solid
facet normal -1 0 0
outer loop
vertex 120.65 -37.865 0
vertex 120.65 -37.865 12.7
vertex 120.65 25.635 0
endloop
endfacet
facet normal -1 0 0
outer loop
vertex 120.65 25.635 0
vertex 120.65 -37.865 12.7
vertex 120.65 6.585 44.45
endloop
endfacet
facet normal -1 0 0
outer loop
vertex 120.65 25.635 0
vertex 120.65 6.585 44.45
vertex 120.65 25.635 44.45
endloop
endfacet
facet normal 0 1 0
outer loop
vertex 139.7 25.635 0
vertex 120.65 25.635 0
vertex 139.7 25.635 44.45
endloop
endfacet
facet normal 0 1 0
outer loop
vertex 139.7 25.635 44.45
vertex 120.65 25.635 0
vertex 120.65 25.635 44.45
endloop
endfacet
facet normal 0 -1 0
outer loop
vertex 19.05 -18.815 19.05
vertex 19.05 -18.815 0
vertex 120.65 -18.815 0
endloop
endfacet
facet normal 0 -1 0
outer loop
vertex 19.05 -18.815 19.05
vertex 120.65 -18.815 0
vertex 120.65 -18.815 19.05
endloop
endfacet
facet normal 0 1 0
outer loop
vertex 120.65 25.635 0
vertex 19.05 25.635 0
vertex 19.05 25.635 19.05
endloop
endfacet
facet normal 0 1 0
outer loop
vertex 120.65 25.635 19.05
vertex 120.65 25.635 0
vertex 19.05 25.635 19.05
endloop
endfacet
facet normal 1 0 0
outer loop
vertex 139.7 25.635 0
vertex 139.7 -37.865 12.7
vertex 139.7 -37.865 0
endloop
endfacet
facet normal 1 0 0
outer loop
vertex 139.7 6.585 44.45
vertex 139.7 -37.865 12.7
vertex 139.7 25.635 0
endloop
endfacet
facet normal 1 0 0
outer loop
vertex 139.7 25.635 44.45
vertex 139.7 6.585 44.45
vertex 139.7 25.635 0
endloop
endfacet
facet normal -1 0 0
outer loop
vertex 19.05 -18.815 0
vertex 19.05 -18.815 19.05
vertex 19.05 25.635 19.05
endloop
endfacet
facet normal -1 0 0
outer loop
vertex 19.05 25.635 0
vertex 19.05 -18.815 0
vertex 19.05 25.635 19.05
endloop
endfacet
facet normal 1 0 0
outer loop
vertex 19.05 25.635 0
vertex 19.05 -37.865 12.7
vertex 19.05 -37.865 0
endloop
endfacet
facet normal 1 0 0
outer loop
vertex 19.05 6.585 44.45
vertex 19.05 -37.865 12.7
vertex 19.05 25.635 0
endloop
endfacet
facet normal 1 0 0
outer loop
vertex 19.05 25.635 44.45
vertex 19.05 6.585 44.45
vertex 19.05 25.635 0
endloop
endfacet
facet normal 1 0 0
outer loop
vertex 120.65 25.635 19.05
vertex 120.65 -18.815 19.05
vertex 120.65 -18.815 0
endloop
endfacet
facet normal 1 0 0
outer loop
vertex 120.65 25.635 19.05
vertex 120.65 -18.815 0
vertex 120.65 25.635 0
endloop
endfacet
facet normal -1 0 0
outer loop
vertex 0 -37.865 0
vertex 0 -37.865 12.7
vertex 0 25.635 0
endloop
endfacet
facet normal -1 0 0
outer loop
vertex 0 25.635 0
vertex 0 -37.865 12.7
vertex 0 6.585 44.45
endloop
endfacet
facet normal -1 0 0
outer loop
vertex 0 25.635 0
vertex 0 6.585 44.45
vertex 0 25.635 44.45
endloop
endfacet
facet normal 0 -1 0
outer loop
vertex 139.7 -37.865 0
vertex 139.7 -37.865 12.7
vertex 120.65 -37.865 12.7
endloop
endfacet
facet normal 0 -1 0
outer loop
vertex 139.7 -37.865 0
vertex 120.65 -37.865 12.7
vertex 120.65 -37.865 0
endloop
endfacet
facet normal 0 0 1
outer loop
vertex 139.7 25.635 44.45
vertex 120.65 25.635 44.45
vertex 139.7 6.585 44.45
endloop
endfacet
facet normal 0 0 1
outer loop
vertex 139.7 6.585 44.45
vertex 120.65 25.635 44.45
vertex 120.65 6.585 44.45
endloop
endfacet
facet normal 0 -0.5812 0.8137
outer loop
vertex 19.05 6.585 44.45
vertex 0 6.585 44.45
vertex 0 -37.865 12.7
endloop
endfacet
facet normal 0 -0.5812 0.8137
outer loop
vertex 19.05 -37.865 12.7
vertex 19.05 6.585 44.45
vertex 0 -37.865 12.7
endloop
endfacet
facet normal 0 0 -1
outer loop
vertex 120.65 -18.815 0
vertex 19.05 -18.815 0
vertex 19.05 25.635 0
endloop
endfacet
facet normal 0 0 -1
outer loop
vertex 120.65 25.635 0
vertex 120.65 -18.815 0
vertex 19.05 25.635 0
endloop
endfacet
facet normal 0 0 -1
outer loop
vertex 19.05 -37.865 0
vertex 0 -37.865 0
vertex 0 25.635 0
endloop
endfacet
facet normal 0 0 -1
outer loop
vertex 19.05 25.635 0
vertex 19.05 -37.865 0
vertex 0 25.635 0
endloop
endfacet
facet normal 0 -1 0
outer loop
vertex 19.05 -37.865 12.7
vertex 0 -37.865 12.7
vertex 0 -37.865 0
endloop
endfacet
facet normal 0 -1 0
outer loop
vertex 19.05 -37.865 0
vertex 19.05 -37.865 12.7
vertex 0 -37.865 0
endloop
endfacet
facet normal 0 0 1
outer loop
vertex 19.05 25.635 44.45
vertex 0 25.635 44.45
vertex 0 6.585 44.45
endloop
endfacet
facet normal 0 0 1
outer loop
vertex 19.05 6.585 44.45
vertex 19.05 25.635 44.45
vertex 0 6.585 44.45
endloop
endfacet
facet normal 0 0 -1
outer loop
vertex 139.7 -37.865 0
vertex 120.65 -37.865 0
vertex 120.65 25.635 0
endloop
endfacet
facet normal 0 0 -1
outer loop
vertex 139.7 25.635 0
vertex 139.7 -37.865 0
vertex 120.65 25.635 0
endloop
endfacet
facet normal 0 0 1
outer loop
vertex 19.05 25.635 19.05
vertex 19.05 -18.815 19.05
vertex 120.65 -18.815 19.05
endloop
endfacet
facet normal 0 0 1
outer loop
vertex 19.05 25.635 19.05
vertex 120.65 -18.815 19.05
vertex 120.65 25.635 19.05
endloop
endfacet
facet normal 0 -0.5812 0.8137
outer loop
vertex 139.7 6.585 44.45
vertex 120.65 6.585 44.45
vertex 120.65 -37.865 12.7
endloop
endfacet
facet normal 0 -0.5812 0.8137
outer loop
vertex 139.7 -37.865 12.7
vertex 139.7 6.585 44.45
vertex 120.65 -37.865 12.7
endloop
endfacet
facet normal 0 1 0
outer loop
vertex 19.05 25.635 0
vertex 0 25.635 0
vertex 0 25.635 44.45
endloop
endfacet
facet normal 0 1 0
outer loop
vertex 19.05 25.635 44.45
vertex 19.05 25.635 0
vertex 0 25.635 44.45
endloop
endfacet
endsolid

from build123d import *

# Parameters (mm, degrees)
F1_DEPTH = 19.05
F2_W     = 44.45
F2_H     = 19.05
F3_DEPTH = 101.6
F5_DEPTH = 19.05


with BuildPart() as f1:
    # F0 (on Right) → F1 (new body)
    with BuildSketch(Plane.YZ):
        Polygon((-37.864814, 0), (25.635186, 0), (25.635186, 44.45), (6.585186, 44.45), (-37.864814, 12.7), align=None)
    extrude(amount=F1_DEPTH)


with BuildPart() as f3:
    # F2 (on face) → F3 (new body)
    with BuildSketch(Plane.YZ.offset(19.05)):
        with Locations((3.410186, 9.525)):
            Rectangle(F2_W, F2_H)
    extrude(amount=F3_DEPTH)


with BuildPart() as f5:
    # F4 (on face) → F5 (new body)
    with BuildSketch(Plane.YZ.offset(120.65)):
        Polygon((-37.864814, 0), (25.635186, 0), (25.635186, 44.45), (6.585186, 44.45), (-37.864814, 12.7), align=None)
    extrude(amount=F5_DEPTH)


solid = Compound([f1.part, f3.part, f5.part])
